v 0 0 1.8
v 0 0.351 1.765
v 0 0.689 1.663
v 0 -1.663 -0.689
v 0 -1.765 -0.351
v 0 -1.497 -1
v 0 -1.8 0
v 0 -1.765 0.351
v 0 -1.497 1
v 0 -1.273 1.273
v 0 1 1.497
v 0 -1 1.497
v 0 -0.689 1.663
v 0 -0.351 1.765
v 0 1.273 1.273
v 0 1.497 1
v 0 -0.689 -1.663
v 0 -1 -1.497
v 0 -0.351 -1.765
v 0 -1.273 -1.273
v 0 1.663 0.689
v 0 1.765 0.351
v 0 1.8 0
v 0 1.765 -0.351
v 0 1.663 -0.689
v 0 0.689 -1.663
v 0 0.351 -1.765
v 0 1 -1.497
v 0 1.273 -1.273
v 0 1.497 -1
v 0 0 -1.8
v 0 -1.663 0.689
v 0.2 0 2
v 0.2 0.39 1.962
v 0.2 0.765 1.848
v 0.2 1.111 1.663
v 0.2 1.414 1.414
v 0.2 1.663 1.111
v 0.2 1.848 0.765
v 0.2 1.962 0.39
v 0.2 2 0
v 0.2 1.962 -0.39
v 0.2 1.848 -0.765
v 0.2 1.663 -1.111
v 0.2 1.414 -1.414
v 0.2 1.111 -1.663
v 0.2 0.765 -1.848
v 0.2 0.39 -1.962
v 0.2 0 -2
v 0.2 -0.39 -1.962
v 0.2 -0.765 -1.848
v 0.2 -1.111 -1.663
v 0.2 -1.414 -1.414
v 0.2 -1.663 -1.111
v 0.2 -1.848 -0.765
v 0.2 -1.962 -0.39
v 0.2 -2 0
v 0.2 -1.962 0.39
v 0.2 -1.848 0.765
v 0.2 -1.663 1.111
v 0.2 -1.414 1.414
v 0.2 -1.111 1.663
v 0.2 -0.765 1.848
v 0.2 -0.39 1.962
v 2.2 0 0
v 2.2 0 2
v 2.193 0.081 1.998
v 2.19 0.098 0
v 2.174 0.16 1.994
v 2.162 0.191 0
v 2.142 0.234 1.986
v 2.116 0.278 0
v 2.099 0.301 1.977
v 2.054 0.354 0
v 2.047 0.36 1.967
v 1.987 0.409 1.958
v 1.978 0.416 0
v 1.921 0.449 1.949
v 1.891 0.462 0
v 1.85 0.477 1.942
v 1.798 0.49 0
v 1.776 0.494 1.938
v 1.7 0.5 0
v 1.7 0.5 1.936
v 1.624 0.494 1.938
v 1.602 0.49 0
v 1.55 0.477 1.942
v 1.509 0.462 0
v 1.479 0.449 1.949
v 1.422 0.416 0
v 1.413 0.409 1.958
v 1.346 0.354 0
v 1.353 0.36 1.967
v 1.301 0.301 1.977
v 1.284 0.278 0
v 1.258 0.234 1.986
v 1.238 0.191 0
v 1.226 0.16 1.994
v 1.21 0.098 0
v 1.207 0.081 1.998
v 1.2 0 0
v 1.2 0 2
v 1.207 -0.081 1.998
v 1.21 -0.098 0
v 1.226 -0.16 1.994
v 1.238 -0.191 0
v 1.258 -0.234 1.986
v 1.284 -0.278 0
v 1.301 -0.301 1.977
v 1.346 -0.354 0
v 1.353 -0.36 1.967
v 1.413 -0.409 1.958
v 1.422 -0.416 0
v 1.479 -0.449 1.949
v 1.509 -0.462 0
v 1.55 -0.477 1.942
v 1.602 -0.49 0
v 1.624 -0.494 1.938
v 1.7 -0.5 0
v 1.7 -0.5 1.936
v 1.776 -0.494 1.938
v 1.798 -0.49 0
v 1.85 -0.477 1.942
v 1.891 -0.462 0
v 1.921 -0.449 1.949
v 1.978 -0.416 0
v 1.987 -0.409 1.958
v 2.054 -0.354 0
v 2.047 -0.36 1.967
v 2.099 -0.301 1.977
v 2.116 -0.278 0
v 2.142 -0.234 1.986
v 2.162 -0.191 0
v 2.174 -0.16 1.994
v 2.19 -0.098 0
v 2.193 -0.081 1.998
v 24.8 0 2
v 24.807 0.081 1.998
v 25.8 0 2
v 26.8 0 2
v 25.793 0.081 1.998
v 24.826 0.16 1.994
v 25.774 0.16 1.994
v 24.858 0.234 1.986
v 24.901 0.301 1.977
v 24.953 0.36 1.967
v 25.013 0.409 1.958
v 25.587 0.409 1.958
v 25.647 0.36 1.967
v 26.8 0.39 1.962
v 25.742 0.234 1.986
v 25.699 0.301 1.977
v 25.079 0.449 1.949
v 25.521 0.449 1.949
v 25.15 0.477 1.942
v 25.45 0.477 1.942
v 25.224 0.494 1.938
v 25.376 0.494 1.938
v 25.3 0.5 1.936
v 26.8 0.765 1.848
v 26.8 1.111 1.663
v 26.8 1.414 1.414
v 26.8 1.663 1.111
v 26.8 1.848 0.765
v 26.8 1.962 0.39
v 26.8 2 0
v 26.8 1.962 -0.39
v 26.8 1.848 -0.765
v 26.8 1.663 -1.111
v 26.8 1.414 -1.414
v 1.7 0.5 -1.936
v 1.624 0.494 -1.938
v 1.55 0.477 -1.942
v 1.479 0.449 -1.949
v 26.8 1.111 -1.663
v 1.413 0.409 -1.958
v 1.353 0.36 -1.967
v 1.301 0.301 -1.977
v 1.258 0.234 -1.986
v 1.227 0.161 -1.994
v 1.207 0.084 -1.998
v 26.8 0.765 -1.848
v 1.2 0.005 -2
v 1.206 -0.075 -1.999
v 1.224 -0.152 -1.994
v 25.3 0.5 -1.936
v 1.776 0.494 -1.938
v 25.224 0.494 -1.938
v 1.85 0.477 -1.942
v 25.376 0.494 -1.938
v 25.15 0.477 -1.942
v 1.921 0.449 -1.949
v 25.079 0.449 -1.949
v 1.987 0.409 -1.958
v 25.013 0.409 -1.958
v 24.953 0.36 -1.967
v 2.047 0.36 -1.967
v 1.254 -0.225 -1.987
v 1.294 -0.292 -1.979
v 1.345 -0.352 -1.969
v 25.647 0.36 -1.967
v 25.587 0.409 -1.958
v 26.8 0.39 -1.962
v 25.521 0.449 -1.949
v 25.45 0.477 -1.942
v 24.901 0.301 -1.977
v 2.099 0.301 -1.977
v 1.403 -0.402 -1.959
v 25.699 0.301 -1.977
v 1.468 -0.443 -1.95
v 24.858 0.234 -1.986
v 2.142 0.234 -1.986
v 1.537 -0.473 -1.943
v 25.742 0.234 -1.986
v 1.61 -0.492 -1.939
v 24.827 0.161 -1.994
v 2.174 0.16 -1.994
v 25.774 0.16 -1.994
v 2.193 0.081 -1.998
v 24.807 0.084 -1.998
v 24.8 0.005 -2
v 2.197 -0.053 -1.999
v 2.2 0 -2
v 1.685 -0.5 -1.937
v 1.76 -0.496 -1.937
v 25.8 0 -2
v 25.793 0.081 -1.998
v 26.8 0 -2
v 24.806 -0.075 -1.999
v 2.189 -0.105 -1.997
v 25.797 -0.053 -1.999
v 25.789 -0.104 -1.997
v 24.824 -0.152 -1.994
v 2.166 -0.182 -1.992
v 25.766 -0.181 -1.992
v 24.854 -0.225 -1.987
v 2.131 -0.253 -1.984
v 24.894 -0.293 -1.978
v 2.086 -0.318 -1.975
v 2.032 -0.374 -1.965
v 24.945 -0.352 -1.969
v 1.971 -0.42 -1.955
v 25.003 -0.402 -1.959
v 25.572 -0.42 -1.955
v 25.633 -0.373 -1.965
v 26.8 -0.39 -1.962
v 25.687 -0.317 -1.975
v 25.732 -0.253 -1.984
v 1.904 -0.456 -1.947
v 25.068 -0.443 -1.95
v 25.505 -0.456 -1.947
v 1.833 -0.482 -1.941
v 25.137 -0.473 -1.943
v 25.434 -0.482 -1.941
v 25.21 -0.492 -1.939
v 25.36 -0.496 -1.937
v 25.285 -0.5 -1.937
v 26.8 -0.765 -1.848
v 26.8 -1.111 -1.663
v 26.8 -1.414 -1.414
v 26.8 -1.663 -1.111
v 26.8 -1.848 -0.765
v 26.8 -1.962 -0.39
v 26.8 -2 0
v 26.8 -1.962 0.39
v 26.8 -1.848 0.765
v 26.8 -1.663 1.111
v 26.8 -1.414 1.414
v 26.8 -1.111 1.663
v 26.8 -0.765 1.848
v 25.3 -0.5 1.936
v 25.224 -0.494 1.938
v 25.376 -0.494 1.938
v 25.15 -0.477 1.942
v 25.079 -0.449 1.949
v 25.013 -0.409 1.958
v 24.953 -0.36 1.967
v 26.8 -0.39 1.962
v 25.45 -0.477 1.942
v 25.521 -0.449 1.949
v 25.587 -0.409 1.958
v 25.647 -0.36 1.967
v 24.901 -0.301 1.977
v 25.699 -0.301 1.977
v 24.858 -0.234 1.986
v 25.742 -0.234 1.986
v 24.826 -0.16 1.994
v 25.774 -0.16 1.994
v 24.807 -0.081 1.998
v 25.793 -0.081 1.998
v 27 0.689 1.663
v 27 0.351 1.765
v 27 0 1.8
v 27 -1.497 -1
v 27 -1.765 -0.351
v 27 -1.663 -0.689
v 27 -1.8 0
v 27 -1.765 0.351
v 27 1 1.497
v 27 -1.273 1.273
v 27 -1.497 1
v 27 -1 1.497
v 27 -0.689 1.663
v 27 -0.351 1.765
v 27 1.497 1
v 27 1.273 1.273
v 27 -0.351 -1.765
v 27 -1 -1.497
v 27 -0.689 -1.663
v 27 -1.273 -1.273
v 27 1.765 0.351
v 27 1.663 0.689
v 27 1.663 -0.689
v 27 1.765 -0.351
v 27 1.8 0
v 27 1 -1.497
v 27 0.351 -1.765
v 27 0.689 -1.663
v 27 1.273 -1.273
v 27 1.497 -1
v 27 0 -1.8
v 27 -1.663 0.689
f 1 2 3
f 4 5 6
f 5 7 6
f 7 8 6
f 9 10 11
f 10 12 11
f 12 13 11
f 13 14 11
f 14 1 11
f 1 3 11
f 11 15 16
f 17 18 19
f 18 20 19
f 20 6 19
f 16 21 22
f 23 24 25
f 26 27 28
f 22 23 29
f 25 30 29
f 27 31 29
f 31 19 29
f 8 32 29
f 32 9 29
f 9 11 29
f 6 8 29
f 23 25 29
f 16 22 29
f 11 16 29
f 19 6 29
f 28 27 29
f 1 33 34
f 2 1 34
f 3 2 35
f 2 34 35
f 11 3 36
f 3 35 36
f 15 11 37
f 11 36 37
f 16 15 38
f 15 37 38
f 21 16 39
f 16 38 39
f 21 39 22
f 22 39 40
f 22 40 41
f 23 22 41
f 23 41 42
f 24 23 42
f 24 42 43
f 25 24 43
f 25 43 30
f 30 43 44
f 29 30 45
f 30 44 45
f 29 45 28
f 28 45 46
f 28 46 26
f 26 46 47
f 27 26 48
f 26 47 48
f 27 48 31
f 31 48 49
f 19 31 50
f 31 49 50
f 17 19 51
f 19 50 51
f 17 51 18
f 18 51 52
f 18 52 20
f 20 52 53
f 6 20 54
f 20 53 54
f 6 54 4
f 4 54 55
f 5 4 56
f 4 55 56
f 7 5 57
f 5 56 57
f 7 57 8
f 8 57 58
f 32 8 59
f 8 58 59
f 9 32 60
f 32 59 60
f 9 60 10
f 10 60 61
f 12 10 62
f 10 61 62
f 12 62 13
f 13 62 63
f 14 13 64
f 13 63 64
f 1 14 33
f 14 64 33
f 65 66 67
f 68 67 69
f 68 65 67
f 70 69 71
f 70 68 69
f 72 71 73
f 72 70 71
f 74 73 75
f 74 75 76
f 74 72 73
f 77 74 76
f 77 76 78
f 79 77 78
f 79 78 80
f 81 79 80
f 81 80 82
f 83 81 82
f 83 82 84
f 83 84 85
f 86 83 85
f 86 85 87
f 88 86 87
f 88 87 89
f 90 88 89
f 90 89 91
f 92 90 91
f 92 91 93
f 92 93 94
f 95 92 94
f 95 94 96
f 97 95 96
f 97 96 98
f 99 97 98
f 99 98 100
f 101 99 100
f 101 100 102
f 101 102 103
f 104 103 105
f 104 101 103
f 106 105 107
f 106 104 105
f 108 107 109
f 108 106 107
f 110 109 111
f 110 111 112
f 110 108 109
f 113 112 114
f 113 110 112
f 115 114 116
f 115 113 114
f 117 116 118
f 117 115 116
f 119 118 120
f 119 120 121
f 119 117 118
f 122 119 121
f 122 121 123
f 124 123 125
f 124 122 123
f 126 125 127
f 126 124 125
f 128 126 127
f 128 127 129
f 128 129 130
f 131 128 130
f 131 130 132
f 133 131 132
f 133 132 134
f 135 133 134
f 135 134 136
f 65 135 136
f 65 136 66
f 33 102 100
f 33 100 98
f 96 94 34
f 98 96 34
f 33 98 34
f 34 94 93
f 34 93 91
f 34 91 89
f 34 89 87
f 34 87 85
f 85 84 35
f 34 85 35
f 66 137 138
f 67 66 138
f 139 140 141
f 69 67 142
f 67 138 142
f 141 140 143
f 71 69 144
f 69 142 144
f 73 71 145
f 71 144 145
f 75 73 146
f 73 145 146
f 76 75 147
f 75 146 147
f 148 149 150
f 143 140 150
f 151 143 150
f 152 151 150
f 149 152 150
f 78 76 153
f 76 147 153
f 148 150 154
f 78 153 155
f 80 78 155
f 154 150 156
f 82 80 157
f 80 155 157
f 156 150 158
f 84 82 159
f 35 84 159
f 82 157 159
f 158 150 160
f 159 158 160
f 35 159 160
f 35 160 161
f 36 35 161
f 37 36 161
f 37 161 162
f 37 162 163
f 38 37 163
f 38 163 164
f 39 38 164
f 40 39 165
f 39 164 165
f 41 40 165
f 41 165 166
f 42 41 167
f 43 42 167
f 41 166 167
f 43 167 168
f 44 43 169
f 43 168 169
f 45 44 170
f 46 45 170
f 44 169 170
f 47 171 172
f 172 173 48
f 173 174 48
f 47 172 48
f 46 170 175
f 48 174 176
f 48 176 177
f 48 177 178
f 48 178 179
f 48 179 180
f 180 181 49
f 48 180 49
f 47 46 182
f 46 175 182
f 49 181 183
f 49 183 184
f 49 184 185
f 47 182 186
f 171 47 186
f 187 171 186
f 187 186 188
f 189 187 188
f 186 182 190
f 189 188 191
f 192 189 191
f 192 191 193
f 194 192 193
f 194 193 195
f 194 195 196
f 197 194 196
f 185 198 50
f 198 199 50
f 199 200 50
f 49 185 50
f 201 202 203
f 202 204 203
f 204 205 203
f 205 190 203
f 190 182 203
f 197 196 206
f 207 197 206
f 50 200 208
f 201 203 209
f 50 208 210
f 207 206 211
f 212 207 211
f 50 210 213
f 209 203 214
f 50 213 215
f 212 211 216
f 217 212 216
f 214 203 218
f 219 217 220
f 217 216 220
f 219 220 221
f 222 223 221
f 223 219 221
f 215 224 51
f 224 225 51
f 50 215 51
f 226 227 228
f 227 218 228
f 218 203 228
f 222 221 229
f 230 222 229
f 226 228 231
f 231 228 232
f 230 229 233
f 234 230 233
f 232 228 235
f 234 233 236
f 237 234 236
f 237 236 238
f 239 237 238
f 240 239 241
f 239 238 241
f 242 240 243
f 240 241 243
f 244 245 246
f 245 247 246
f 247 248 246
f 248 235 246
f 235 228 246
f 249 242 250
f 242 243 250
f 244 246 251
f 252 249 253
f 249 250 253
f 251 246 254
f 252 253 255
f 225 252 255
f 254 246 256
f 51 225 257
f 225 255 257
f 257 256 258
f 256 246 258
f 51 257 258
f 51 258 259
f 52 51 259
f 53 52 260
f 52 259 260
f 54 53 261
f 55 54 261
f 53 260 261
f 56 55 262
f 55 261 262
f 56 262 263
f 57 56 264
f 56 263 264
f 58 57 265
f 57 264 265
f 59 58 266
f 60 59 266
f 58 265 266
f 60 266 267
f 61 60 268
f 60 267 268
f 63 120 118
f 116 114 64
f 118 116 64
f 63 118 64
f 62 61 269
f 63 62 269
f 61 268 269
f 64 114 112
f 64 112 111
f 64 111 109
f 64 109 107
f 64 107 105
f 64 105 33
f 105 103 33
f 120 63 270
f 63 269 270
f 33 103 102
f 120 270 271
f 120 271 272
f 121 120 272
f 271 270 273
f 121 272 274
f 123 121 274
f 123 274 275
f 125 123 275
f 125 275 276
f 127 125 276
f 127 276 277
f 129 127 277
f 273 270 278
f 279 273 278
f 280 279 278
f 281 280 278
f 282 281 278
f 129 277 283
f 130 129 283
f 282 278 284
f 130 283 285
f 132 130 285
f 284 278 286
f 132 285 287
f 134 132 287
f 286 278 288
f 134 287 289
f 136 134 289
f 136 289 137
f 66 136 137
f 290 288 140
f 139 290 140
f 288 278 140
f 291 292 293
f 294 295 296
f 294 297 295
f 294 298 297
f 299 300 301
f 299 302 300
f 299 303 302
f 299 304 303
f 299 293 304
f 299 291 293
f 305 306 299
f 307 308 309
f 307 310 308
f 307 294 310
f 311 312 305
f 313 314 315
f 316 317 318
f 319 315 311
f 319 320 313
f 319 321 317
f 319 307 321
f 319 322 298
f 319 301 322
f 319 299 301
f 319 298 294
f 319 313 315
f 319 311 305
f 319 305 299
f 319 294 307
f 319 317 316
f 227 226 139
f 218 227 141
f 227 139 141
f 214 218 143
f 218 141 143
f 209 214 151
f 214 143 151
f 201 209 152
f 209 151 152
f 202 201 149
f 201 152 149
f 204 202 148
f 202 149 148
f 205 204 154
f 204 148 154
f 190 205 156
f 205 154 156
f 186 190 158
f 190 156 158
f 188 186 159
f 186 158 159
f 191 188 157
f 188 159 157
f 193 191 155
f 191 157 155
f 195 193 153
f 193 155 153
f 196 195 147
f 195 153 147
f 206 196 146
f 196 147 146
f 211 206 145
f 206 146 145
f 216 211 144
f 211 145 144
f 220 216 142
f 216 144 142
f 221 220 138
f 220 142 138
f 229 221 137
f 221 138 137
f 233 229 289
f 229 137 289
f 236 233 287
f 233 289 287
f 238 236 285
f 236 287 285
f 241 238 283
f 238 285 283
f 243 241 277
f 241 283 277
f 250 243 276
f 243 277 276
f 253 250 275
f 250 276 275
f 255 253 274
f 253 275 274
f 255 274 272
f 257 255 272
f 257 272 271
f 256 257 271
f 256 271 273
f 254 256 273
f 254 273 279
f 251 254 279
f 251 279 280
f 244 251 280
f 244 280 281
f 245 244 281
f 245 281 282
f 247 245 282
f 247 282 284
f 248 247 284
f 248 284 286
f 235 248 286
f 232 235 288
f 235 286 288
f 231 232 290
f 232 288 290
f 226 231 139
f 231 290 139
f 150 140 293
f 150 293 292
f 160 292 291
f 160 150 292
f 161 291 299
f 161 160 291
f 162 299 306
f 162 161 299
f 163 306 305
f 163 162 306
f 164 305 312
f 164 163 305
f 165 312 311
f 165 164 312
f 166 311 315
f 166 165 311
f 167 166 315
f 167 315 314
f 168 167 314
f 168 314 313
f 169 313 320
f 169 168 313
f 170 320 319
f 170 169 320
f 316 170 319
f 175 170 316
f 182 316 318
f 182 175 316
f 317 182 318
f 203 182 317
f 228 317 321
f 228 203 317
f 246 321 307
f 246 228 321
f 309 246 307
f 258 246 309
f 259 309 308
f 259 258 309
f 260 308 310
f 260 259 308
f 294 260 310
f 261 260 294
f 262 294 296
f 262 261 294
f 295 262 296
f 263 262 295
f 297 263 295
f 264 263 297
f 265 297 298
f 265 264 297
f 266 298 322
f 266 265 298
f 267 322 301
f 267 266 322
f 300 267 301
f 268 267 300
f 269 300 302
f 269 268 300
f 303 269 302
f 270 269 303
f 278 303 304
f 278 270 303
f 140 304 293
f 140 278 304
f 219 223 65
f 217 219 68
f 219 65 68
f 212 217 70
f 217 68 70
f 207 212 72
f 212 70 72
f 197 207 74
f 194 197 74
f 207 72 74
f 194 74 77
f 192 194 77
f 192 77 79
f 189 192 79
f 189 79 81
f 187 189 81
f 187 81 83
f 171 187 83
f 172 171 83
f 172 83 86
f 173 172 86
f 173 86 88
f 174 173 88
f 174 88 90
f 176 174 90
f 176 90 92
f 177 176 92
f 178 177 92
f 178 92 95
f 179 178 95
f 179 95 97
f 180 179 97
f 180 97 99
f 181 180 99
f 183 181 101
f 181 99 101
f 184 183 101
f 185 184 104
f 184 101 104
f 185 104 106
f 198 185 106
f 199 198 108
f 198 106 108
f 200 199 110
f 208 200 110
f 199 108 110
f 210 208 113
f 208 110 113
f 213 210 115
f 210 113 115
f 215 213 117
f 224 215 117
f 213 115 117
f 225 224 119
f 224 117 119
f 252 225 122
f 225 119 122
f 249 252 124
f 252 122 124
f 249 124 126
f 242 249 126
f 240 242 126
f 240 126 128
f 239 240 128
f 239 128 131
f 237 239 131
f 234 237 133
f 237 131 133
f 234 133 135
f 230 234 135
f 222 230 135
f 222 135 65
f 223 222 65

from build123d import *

# Parameters (mm, degrees)
F0_W     = 27
F0_H     = 2
F2_SIZE  = 0.2
F3_R     = 0.5
F4_DEPTH = 2.5


with BuildPart() as f1:
    # F0 (on Front) → F1 (revolve)
    with BuildSketch(Plane.XZ):
        with Locations((13.5, 1)):
            Rectangle(F0_W, F0_H)
    revolve(axis=Axis((13.5, 0, 0), (-1, 0, 0)))

    # F2
    f2_edges = [f1.edges().sort_by_distance(p)[0] for p in [
        (0, 0, -2),
        (27, 0, -2),
    ]]
    chamfer(f2_edges, length=F2_SIZE)

    # F3 (on Top) → F4 (cut, symmetric)
    with BuildSketch(Plane.XY):
        with Locations((1.7, 0)):
            Circle(F3_R)
        with Locations((25.3, 0)):
            Circle(F3_R)
    extrude(amount=F4_DEPTH, both=True, mode=Mode.SUBTRACT)


solid = f1.part
